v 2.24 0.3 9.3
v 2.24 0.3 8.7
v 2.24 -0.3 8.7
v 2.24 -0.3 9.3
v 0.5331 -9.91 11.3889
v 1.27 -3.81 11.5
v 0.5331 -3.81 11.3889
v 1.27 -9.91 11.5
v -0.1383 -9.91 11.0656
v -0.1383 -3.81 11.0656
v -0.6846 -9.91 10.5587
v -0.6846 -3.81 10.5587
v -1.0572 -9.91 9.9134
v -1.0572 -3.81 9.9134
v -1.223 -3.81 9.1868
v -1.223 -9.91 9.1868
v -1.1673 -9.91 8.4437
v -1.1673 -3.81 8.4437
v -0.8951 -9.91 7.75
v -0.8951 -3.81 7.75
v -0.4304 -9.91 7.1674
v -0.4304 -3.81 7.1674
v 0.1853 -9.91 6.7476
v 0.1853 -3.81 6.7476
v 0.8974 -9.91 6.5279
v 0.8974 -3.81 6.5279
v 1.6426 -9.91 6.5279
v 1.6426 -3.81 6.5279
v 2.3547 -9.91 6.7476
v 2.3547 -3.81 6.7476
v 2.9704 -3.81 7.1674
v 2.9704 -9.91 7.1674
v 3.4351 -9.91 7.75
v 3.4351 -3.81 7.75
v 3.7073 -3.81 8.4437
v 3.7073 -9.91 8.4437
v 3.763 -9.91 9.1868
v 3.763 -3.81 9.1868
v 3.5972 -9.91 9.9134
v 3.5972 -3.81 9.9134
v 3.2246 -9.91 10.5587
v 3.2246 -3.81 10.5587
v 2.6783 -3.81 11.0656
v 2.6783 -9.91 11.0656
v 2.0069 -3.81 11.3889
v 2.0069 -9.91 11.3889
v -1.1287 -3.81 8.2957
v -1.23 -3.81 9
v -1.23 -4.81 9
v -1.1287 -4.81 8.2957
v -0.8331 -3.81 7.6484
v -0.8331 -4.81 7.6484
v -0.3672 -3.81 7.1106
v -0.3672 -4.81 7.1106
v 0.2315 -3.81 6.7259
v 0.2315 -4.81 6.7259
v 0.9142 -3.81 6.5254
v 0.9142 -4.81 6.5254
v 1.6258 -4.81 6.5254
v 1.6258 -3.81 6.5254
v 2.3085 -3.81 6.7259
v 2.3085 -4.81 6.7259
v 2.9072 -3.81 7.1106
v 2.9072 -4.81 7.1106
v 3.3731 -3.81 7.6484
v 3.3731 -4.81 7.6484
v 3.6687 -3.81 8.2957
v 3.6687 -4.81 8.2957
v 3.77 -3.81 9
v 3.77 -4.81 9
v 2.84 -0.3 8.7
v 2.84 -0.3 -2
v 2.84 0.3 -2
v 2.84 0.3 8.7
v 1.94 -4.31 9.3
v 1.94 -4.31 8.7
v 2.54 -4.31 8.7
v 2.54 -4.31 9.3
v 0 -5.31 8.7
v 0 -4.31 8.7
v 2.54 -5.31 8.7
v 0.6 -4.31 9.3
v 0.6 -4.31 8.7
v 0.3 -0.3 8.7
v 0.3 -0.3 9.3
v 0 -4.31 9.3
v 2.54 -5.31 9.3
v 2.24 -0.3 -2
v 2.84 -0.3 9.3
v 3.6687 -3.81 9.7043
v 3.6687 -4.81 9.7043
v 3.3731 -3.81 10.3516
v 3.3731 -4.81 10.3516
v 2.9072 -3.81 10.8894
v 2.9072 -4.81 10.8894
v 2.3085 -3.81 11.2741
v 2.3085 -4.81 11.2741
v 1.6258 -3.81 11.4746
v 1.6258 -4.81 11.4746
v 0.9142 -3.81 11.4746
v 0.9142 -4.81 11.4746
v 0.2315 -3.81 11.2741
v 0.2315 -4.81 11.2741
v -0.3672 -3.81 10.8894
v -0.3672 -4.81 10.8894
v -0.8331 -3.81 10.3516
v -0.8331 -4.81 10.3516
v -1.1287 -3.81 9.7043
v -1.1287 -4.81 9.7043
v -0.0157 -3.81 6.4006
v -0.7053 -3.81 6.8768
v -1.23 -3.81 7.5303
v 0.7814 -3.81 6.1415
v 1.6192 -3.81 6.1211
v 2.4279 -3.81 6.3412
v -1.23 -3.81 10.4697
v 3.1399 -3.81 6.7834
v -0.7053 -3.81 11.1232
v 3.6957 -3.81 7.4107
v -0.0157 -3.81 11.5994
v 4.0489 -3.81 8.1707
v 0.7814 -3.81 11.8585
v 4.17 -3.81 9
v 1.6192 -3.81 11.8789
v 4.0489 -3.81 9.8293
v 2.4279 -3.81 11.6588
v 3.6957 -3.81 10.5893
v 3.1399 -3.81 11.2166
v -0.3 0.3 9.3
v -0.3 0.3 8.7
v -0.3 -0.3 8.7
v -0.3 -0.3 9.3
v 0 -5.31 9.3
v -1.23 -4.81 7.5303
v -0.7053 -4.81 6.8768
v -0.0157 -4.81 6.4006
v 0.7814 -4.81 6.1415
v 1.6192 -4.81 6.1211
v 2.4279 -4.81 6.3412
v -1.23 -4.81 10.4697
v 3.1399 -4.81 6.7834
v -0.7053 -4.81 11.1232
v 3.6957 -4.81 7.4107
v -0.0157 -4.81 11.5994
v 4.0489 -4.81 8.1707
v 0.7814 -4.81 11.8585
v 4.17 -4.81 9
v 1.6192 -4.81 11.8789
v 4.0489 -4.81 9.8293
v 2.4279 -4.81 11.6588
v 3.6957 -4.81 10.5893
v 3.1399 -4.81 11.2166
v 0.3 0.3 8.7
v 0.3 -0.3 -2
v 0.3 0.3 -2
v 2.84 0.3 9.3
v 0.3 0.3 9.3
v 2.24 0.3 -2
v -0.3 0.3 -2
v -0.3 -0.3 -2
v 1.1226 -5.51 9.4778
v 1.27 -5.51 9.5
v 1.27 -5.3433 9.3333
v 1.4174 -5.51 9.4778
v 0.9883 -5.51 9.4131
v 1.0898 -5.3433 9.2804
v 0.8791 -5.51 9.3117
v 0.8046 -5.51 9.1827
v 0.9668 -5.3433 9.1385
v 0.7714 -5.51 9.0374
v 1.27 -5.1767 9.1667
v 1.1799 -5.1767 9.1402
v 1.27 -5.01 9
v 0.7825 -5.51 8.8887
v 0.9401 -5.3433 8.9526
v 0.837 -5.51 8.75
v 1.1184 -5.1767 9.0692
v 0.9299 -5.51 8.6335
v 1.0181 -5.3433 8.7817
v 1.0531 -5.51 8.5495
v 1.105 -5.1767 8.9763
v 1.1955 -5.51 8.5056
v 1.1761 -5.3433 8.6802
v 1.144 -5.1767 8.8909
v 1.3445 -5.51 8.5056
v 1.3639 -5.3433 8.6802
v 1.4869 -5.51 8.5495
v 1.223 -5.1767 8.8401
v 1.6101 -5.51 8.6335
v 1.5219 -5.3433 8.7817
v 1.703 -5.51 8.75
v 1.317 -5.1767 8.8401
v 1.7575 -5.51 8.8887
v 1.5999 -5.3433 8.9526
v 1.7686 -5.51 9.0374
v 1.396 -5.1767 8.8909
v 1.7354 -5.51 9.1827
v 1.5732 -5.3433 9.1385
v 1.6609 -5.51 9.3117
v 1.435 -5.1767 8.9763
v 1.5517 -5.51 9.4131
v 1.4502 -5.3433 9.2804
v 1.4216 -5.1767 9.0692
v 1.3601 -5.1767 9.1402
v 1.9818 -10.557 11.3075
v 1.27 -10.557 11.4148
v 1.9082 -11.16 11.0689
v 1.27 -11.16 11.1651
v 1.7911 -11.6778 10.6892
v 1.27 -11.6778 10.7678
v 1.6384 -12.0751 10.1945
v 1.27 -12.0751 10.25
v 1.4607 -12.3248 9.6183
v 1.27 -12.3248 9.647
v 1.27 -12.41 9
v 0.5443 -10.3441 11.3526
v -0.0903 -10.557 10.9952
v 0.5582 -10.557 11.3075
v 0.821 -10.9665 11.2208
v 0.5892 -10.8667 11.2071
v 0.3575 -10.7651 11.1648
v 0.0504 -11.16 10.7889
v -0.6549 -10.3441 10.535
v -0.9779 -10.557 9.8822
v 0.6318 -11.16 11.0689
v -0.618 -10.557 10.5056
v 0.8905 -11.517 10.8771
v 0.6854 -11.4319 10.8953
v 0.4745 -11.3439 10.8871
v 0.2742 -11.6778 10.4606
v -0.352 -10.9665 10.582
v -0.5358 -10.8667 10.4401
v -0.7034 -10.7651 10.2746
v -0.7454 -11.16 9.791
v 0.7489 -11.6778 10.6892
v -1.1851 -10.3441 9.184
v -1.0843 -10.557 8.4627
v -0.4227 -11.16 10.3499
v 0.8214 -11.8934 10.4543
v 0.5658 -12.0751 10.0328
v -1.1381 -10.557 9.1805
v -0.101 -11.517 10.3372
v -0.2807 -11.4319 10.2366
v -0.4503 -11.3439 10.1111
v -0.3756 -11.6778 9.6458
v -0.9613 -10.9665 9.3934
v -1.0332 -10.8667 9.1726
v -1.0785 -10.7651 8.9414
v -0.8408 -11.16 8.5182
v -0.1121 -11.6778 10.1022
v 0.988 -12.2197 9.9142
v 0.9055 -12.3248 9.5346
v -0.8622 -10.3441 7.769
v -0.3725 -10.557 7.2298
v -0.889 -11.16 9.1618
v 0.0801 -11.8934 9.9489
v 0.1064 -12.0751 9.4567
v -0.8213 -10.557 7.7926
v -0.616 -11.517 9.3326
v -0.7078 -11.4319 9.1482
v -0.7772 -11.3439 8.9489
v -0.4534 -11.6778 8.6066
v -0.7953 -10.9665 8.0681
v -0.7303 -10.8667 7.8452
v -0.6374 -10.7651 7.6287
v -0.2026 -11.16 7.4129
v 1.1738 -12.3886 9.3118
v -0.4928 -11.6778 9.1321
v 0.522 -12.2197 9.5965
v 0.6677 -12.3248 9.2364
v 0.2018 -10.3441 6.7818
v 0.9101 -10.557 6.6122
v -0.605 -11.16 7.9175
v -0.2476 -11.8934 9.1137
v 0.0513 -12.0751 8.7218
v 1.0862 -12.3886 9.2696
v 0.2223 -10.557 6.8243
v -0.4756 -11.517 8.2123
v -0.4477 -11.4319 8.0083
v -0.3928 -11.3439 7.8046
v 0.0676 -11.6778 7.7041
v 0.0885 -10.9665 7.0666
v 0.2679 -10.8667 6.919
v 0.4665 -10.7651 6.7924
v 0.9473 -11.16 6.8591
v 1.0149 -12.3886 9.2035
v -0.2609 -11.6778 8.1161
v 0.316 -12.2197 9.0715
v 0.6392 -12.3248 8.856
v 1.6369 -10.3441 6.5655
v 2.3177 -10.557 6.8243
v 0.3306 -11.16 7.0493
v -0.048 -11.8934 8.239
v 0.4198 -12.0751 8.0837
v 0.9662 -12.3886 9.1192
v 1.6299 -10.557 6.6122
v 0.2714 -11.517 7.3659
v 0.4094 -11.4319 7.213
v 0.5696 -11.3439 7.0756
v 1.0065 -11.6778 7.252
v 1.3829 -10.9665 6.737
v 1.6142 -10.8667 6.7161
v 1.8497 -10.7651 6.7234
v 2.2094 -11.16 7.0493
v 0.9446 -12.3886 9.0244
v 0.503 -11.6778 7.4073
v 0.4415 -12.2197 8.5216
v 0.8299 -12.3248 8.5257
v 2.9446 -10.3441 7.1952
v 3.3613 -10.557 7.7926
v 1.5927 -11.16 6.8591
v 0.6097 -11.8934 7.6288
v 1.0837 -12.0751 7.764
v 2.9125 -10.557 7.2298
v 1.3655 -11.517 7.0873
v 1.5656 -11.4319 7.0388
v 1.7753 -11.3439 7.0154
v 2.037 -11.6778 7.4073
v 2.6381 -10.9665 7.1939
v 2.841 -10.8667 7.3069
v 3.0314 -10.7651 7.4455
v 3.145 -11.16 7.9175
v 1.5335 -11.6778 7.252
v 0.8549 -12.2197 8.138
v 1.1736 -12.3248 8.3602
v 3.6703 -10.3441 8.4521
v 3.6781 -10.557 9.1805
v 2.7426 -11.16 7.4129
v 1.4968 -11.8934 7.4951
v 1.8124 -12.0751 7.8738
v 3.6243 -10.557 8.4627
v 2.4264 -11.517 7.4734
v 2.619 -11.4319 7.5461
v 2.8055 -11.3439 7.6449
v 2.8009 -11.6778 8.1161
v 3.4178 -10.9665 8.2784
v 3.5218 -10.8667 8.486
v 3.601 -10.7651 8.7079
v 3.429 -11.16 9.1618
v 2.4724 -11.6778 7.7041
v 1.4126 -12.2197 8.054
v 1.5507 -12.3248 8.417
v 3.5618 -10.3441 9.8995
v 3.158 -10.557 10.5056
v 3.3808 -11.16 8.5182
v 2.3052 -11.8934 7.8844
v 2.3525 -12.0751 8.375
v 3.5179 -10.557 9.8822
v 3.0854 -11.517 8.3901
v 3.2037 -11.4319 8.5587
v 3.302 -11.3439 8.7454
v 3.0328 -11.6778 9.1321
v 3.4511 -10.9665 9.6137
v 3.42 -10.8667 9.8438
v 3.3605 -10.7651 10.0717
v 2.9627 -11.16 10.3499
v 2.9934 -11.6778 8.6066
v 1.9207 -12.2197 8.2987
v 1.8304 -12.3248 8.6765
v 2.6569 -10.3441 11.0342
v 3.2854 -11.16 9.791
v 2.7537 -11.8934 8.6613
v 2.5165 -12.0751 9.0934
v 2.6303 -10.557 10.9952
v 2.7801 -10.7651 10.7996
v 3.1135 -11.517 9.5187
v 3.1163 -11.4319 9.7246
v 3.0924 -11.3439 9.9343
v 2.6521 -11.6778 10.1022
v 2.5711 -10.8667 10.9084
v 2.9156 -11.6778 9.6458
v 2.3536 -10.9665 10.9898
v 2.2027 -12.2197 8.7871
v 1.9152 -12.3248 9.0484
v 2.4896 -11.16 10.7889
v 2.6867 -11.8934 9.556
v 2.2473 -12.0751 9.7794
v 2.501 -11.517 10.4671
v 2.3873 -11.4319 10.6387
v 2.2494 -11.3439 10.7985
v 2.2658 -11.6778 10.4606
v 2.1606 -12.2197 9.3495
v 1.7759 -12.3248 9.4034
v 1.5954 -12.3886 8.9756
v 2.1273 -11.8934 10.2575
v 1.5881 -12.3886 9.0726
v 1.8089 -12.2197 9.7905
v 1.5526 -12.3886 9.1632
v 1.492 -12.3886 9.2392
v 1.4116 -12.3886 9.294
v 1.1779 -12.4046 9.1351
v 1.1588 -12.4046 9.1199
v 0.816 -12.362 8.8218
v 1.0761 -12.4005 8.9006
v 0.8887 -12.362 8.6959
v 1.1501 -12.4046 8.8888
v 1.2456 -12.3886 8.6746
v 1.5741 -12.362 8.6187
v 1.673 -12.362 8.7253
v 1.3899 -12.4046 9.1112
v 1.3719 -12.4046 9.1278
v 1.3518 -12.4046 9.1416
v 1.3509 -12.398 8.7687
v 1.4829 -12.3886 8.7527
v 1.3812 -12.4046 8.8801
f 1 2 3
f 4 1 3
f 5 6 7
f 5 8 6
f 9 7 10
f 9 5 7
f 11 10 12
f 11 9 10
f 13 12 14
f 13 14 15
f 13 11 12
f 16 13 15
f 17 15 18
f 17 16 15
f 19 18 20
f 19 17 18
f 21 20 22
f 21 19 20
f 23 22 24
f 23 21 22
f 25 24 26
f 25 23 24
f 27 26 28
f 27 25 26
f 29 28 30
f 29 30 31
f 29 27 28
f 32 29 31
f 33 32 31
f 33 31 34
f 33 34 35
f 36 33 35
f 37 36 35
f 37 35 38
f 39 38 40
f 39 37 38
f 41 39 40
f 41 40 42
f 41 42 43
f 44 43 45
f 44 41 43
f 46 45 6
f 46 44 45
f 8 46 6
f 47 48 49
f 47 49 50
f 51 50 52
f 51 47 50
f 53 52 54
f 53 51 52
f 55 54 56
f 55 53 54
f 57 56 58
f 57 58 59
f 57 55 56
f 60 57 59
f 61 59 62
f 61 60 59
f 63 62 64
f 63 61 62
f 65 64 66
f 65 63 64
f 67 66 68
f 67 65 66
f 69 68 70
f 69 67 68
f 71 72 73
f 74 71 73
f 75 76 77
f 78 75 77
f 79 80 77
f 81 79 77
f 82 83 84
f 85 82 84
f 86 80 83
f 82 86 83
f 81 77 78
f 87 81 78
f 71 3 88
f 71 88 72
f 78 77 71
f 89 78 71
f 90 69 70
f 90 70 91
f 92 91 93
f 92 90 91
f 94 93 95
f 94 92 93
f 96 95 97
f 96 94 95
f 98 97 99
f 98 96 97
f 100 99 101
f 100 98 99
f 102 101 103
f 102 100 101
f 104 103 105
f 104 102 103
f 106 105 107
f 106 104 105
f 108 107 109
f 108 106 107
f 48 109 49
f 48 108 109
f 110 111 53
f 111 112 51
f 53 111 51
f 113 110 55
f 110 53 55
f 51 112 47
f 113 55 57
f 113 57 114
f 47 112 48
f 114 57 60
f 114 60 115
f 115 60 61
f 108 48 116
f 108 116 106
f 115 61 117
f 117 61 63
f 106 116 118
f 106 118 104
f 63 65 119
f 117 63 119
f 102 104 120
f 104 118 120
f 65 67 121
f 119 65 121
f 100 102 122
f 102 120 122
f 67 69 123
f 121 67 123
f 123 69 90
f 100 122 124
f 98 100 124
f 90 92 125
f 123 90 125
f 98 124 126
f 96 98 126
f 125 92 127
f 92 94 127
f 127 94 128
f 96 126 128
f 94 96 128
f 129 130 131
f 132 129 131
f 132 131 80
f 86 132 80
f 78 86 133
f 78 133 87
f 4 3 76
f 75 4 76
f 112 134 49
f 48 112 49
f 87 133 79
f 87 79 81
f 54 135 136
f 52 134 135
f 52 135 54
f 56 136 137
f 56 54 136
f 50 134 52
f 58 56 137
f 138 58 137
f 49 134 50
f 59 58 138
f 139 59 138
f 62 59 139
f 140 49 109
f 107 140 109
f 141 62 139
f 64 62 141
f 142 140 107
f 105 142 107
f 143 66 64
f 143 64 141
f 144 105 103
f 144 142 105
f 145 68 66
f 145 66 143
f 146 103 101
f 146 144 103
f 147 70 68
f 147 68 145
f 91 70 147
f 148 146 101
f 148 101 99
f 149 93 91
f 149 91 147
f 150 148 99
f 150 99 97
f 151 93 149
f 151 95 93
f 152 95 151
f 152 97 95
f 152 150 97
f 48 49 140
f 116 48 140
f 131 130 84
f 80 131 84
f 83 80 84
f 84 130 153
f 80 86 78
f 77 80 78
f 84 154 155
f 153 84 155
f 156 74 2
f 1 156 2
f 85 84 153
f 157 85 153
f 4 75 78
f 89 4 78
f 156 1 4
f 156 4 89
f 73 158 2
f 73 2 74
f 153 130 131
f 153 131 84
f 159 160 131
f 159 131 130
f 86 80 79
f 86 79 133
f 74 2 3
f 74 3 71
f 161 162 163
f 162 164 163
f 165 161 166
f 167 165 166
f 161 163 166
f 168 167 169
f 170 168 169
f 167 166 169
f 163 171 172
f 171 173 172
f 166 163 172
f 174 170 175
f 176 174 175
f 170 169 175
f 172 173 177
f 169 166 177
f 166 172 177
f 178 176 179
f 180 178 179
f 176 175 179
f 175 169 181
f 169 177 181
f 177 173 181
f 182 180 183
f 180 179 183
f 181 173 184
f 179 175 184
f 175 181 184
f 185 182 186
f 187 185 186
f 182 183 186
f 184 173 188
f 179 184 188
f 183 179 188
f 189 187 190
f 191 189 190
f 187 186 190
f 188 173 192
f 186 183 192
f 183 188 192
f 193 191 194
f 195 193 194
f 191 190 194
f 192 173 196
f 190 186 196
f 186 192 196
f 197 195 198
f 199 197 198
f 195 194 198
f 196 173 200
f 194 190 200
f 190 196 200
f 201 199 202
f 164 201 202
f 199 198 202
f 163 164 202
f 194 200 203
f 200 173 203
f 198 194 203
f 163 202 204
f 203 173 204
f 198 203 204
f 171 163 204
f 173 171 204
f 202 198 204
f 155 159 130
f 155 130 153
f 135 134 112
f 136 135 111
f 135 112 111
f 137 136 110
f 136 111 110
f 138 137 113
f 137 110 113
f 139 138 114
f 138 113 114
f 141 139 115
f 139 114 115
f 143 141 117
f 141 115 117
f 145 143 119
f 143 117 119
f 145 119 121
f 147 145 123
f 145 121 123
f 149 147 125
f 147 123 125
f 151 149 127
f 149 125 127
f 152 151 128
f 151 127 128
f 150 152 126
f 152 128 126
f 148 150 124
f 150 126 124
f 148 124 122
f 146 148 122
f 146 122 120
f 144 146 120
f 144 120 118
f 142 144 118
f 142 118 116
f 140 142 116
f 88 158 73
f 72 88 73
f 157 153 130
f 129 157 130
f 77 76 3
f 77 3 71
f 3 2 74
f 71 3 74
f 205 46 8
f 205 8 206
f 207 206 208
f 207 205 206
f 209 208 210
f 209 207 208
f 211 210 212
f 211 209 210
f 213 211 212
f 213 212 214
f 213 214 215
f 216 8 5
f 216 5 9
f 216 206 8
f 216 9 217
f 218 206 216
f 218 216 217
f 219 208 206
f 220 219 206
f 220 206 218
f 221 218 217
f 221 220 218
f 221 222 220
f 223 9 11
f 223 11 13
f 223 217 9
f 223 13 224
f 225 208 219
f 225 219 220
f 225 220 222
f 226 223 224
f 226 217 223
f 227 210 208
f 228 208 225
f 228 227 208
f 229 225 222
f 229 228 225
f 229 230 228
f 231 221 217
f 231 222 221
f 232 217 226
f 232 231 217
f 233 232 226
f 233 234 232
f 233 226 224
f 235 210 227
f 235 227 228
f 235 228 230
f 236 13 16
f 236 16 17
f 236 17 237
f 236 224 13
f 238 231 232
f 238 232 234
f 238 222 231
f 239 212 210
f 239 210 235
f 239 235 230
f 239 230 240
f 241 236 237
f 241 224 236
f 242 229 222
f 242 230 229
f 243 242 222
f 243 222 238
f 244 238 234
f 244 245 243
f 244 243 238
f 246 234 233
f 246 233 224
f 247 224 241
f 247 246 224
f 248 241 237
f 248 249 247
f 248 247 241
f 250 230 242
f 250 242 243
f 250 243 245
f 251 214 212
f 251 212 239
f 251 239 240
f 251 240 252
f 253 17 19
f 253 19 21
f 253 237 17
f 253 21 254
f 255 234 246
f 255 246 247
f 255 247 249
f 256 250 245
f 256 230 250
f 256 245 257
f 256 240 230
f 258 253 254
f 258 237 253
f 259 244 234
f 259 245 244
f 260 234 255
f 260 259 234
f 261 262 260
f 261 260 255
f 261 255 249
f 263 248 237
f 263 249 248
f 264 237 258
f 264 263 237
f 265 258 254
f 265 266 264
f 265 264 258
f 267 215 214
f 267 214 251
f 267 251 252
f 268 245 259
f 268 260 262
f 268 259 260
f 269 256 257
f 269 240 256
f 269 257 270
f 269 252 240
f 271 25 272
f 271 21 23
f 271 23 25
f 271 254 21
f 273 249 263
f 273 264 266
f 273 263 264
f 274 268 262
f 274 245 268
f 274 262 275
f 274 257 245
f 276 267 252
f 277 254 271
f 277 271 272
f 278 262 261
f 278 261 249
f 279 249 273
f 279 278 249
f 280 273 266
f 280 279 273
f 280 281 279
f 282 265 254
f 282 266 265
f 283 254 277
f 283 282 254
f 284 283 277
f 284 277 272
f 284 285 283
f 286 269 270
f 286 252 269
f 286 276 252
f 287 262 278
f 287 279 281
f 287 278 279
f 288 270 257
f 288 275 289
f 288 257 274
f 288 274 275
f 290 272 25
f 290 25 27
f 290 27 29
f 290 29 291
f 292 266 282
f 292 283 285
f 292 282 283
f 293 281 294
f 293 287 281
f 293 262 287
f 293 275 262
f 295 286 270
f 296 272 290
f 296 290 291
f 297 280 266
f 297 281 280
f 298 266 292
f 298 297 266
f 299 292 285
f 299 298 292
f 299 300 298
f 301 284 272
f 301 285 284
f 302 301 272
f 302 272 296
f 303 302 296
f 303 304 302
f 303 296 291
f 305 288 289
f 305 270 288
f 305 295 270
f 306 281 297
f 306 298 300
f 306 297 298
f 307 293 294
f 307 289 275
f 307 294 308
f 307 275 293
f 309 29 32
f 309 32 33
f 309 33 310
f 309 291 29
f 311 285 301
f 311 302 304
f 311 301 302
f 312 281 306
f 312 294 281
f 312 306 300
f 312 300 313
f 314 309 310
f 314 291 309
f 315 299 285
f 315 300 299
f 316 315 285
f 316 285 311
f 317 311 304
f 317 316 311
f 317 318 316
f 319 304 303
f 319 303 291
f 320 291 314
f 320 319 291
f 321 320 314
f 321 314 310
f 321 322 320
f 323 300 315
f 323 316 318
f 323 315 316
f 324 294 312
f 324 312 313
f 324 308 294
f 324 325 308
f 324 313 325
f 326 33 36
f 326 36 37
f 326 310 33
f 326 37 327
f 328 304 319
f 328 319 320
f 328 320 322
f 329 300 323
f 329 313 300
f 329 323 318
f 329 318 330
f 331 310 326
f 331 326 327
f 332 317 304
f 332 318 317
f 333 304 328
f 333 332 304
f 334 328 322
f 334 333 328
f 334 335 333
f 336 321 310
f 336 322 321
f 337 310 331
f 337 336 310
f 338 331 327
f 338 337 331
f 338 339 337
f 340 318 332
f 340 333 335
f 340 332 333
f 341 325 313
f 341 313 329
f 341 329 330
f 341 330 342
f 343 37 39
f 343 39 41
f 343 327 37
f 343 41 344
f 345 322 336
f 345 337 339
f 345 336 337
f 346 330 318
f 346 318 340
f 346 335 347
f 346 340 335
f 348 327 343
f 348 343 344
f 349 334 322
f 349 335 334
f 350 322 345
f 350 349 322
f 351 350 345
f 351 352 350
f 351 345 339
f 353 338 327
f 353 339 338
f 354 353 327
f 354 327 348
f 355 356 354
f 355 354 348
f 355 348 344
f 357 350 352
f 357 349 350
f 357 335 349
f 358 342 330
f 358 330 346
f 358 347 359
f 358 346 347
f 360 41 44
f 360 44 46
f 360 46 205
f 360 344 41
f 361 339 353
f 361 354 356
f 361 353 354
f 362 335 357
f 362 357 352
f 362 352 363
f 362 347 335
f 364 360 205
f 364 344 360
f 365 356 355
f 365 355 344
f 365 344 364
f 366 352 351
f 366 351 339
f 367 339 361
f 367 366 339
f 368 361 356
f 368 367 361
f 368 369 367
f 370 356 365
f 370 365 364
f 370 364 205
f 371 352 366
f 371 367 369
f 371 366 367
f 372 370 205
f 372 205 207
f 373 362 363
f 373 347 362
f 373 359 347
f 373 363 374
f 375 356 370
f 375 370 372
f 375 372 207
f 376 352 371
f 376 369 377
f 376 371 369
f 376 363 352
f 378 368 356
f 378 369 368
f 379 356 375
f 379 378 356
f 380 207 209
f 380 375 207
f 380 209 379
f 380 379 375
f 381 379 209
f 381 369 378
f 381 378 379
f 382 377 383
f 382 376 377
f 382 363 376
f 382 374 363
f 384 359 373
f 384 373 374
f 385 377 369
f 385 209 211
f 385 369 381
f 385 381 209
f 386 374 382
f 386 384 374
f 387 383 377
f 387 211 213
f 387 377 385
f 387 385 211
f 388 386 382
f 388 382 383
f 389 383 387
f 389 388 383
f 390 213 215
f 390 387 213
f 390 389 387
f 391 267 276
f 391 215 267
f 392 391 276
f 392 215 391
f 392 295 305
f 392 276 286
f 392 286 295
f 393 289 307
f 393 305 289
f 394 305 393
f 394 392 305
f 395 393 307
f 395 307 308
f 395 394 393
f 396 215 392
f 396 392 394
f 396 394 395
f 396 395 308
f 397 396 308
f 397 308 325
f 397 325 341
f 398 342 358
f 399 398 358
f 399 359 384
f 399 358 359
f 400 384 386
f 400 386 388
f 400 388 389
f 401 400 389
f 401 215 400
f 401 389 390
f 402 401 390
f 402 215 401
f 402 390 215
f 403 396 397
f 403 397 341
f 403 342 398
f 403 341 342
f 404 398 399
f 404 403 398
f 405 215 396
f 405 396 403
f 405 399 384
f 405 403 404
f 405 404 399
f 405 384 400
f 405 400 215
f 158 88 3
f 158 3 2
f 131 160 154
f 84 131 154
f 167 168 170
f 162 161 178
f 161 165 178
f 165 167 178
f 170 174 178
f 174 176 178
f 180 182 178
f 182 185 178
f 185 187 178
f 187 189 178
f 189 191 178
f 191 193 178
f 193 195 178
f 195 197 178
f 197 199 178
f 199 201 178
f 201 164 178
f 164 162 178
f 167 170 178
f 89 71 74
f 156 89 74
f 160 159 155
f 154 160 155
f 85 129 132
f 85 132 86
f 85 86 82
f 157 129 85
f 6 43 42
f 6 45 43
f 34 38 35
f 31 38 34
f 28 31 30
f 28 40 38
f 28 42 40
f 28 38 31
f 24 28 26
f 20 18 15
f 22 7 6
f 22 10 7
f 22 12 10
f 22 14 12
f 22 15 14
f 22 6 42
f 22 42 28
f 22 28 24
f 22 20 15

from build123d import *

# Parameters (mm, degrees)
SKETCH_W       = 0.6
SKETCH_H       = 0.6
PAD_DEPTH      = 8.7
PAD_DEPTH_BACK = 2
PAD001_DEPTH   = 0.6
SKETCH002_W    = 2.54
SKETCH002_H    = 0.6
PAD002_DEPTH   = 1
SKETCH004_R    = 2.9
SKETCH004_R_2  = 2.5
PAD003_DEPTH   = 1
SKETCH006_W    = 0.4
SKETCH006_H    = 5.8
POCKET_DEPTH   = 1.001


with BuildPart() as pad:
    # Sketch → Pad (new body, two sides)
    with BuildSketch(Plane.XY) as pad_sk:
        Rectangle(SKETCH_W, SKETCH_H)
        with Locations((2.54, 0)):
            Rectangle(SKETCH_W, SKETCH_H)
    extrude(amount=PAD_DEPTH)
    extrude(pad_sk.sketch, amount=-PAD_DEPTH_BACK)


with BuildPart() as pad001:
    # Sketch001 → Pad001 (new body)
    with BuildSketch(Plane.XY.offset(8.7)):
        Polygon((0.3, 0.3), (-0.3, 0.3), (-0.3, -0.3), (0, -4.31), (0.6, -4.31), (0.3, -0.3), align=None)
        Polygon((2.84, 0.3), (2.24, 0.3), (2.24, -0.3), (1.94, -4.31), (2.54, -4.31), (2.84, -0.3), align=None)
    extrude(amount=PAD001_DEPTH)


with BuildPart() as pad002:
    # Sketch002 → Pad002 (new body)
    with BuildSketch(Plane.XZ.offset(4.31)):
        with Locations((1.27, 9)):
            Rectangle(SKETCH002_W, SKETCH002_H)
    extrude(amount=PAD002_DEPTH)


with BuildPart() as revolution:
    # Sketch003 → Revolution (revolve)
    with BuildSketch(Plane.YZ.offset(1.27)):
        with BuildLine():
            Line((-3.81, 9), (-12.41, 9))
            ThreePointArc((-9.91, 11.5), (-11.677767, 10.767767), (-12.41, 9))
            Line((-3.81, 11.5), (-9.91, 11.5))
            Line((-3.81, 9), (-3.81, 11.5))
        make_face()
    revolve(axis=Axis((1.27, -5.810397, 9), (0, -1, 0)))


with BuildPart() as revolution001:
    # Sketch005 → Revolution001 (revolve)
    with BuildSketch(Plane.YZ.offset(1.27)):
        Polygon((-5.01, 9), (-5.51, 9), (-5.51, 9.5), align=None)
    revolve(axis=Axis((1.27, -3.977201, 9), (0, -1, 0)))


with BuildPart() as pocket:
    # Sketch004 → Pad003 (new body)
    with BuildSketch(Plane.XZ.offset(3.81)):
        with Locations((1.27, 9)):
            Circle(SKETCH004_R)
        with Locations((1.27, 9)):
            Circle(SKETCH004_R_2, mode=Mode.SUBTRACT)
    extrude(amount=PAD003_DEPTH)

    # Sketch006 → Pocket (cut, through all)
    with BuildSketch(Plane.XZ.offset(4.81)):
        with Locations((-1.43, 9)):
            Rectangle(SKETCH006_W, SKETCH006_H)
    extrude(amount=-POCKET_DEPTH, mode=Mode.SUBTRACT)


solid = Compound([pad.part, pad001.part, pad002.part, revolution.part, revolution001.part, pocket.part])
